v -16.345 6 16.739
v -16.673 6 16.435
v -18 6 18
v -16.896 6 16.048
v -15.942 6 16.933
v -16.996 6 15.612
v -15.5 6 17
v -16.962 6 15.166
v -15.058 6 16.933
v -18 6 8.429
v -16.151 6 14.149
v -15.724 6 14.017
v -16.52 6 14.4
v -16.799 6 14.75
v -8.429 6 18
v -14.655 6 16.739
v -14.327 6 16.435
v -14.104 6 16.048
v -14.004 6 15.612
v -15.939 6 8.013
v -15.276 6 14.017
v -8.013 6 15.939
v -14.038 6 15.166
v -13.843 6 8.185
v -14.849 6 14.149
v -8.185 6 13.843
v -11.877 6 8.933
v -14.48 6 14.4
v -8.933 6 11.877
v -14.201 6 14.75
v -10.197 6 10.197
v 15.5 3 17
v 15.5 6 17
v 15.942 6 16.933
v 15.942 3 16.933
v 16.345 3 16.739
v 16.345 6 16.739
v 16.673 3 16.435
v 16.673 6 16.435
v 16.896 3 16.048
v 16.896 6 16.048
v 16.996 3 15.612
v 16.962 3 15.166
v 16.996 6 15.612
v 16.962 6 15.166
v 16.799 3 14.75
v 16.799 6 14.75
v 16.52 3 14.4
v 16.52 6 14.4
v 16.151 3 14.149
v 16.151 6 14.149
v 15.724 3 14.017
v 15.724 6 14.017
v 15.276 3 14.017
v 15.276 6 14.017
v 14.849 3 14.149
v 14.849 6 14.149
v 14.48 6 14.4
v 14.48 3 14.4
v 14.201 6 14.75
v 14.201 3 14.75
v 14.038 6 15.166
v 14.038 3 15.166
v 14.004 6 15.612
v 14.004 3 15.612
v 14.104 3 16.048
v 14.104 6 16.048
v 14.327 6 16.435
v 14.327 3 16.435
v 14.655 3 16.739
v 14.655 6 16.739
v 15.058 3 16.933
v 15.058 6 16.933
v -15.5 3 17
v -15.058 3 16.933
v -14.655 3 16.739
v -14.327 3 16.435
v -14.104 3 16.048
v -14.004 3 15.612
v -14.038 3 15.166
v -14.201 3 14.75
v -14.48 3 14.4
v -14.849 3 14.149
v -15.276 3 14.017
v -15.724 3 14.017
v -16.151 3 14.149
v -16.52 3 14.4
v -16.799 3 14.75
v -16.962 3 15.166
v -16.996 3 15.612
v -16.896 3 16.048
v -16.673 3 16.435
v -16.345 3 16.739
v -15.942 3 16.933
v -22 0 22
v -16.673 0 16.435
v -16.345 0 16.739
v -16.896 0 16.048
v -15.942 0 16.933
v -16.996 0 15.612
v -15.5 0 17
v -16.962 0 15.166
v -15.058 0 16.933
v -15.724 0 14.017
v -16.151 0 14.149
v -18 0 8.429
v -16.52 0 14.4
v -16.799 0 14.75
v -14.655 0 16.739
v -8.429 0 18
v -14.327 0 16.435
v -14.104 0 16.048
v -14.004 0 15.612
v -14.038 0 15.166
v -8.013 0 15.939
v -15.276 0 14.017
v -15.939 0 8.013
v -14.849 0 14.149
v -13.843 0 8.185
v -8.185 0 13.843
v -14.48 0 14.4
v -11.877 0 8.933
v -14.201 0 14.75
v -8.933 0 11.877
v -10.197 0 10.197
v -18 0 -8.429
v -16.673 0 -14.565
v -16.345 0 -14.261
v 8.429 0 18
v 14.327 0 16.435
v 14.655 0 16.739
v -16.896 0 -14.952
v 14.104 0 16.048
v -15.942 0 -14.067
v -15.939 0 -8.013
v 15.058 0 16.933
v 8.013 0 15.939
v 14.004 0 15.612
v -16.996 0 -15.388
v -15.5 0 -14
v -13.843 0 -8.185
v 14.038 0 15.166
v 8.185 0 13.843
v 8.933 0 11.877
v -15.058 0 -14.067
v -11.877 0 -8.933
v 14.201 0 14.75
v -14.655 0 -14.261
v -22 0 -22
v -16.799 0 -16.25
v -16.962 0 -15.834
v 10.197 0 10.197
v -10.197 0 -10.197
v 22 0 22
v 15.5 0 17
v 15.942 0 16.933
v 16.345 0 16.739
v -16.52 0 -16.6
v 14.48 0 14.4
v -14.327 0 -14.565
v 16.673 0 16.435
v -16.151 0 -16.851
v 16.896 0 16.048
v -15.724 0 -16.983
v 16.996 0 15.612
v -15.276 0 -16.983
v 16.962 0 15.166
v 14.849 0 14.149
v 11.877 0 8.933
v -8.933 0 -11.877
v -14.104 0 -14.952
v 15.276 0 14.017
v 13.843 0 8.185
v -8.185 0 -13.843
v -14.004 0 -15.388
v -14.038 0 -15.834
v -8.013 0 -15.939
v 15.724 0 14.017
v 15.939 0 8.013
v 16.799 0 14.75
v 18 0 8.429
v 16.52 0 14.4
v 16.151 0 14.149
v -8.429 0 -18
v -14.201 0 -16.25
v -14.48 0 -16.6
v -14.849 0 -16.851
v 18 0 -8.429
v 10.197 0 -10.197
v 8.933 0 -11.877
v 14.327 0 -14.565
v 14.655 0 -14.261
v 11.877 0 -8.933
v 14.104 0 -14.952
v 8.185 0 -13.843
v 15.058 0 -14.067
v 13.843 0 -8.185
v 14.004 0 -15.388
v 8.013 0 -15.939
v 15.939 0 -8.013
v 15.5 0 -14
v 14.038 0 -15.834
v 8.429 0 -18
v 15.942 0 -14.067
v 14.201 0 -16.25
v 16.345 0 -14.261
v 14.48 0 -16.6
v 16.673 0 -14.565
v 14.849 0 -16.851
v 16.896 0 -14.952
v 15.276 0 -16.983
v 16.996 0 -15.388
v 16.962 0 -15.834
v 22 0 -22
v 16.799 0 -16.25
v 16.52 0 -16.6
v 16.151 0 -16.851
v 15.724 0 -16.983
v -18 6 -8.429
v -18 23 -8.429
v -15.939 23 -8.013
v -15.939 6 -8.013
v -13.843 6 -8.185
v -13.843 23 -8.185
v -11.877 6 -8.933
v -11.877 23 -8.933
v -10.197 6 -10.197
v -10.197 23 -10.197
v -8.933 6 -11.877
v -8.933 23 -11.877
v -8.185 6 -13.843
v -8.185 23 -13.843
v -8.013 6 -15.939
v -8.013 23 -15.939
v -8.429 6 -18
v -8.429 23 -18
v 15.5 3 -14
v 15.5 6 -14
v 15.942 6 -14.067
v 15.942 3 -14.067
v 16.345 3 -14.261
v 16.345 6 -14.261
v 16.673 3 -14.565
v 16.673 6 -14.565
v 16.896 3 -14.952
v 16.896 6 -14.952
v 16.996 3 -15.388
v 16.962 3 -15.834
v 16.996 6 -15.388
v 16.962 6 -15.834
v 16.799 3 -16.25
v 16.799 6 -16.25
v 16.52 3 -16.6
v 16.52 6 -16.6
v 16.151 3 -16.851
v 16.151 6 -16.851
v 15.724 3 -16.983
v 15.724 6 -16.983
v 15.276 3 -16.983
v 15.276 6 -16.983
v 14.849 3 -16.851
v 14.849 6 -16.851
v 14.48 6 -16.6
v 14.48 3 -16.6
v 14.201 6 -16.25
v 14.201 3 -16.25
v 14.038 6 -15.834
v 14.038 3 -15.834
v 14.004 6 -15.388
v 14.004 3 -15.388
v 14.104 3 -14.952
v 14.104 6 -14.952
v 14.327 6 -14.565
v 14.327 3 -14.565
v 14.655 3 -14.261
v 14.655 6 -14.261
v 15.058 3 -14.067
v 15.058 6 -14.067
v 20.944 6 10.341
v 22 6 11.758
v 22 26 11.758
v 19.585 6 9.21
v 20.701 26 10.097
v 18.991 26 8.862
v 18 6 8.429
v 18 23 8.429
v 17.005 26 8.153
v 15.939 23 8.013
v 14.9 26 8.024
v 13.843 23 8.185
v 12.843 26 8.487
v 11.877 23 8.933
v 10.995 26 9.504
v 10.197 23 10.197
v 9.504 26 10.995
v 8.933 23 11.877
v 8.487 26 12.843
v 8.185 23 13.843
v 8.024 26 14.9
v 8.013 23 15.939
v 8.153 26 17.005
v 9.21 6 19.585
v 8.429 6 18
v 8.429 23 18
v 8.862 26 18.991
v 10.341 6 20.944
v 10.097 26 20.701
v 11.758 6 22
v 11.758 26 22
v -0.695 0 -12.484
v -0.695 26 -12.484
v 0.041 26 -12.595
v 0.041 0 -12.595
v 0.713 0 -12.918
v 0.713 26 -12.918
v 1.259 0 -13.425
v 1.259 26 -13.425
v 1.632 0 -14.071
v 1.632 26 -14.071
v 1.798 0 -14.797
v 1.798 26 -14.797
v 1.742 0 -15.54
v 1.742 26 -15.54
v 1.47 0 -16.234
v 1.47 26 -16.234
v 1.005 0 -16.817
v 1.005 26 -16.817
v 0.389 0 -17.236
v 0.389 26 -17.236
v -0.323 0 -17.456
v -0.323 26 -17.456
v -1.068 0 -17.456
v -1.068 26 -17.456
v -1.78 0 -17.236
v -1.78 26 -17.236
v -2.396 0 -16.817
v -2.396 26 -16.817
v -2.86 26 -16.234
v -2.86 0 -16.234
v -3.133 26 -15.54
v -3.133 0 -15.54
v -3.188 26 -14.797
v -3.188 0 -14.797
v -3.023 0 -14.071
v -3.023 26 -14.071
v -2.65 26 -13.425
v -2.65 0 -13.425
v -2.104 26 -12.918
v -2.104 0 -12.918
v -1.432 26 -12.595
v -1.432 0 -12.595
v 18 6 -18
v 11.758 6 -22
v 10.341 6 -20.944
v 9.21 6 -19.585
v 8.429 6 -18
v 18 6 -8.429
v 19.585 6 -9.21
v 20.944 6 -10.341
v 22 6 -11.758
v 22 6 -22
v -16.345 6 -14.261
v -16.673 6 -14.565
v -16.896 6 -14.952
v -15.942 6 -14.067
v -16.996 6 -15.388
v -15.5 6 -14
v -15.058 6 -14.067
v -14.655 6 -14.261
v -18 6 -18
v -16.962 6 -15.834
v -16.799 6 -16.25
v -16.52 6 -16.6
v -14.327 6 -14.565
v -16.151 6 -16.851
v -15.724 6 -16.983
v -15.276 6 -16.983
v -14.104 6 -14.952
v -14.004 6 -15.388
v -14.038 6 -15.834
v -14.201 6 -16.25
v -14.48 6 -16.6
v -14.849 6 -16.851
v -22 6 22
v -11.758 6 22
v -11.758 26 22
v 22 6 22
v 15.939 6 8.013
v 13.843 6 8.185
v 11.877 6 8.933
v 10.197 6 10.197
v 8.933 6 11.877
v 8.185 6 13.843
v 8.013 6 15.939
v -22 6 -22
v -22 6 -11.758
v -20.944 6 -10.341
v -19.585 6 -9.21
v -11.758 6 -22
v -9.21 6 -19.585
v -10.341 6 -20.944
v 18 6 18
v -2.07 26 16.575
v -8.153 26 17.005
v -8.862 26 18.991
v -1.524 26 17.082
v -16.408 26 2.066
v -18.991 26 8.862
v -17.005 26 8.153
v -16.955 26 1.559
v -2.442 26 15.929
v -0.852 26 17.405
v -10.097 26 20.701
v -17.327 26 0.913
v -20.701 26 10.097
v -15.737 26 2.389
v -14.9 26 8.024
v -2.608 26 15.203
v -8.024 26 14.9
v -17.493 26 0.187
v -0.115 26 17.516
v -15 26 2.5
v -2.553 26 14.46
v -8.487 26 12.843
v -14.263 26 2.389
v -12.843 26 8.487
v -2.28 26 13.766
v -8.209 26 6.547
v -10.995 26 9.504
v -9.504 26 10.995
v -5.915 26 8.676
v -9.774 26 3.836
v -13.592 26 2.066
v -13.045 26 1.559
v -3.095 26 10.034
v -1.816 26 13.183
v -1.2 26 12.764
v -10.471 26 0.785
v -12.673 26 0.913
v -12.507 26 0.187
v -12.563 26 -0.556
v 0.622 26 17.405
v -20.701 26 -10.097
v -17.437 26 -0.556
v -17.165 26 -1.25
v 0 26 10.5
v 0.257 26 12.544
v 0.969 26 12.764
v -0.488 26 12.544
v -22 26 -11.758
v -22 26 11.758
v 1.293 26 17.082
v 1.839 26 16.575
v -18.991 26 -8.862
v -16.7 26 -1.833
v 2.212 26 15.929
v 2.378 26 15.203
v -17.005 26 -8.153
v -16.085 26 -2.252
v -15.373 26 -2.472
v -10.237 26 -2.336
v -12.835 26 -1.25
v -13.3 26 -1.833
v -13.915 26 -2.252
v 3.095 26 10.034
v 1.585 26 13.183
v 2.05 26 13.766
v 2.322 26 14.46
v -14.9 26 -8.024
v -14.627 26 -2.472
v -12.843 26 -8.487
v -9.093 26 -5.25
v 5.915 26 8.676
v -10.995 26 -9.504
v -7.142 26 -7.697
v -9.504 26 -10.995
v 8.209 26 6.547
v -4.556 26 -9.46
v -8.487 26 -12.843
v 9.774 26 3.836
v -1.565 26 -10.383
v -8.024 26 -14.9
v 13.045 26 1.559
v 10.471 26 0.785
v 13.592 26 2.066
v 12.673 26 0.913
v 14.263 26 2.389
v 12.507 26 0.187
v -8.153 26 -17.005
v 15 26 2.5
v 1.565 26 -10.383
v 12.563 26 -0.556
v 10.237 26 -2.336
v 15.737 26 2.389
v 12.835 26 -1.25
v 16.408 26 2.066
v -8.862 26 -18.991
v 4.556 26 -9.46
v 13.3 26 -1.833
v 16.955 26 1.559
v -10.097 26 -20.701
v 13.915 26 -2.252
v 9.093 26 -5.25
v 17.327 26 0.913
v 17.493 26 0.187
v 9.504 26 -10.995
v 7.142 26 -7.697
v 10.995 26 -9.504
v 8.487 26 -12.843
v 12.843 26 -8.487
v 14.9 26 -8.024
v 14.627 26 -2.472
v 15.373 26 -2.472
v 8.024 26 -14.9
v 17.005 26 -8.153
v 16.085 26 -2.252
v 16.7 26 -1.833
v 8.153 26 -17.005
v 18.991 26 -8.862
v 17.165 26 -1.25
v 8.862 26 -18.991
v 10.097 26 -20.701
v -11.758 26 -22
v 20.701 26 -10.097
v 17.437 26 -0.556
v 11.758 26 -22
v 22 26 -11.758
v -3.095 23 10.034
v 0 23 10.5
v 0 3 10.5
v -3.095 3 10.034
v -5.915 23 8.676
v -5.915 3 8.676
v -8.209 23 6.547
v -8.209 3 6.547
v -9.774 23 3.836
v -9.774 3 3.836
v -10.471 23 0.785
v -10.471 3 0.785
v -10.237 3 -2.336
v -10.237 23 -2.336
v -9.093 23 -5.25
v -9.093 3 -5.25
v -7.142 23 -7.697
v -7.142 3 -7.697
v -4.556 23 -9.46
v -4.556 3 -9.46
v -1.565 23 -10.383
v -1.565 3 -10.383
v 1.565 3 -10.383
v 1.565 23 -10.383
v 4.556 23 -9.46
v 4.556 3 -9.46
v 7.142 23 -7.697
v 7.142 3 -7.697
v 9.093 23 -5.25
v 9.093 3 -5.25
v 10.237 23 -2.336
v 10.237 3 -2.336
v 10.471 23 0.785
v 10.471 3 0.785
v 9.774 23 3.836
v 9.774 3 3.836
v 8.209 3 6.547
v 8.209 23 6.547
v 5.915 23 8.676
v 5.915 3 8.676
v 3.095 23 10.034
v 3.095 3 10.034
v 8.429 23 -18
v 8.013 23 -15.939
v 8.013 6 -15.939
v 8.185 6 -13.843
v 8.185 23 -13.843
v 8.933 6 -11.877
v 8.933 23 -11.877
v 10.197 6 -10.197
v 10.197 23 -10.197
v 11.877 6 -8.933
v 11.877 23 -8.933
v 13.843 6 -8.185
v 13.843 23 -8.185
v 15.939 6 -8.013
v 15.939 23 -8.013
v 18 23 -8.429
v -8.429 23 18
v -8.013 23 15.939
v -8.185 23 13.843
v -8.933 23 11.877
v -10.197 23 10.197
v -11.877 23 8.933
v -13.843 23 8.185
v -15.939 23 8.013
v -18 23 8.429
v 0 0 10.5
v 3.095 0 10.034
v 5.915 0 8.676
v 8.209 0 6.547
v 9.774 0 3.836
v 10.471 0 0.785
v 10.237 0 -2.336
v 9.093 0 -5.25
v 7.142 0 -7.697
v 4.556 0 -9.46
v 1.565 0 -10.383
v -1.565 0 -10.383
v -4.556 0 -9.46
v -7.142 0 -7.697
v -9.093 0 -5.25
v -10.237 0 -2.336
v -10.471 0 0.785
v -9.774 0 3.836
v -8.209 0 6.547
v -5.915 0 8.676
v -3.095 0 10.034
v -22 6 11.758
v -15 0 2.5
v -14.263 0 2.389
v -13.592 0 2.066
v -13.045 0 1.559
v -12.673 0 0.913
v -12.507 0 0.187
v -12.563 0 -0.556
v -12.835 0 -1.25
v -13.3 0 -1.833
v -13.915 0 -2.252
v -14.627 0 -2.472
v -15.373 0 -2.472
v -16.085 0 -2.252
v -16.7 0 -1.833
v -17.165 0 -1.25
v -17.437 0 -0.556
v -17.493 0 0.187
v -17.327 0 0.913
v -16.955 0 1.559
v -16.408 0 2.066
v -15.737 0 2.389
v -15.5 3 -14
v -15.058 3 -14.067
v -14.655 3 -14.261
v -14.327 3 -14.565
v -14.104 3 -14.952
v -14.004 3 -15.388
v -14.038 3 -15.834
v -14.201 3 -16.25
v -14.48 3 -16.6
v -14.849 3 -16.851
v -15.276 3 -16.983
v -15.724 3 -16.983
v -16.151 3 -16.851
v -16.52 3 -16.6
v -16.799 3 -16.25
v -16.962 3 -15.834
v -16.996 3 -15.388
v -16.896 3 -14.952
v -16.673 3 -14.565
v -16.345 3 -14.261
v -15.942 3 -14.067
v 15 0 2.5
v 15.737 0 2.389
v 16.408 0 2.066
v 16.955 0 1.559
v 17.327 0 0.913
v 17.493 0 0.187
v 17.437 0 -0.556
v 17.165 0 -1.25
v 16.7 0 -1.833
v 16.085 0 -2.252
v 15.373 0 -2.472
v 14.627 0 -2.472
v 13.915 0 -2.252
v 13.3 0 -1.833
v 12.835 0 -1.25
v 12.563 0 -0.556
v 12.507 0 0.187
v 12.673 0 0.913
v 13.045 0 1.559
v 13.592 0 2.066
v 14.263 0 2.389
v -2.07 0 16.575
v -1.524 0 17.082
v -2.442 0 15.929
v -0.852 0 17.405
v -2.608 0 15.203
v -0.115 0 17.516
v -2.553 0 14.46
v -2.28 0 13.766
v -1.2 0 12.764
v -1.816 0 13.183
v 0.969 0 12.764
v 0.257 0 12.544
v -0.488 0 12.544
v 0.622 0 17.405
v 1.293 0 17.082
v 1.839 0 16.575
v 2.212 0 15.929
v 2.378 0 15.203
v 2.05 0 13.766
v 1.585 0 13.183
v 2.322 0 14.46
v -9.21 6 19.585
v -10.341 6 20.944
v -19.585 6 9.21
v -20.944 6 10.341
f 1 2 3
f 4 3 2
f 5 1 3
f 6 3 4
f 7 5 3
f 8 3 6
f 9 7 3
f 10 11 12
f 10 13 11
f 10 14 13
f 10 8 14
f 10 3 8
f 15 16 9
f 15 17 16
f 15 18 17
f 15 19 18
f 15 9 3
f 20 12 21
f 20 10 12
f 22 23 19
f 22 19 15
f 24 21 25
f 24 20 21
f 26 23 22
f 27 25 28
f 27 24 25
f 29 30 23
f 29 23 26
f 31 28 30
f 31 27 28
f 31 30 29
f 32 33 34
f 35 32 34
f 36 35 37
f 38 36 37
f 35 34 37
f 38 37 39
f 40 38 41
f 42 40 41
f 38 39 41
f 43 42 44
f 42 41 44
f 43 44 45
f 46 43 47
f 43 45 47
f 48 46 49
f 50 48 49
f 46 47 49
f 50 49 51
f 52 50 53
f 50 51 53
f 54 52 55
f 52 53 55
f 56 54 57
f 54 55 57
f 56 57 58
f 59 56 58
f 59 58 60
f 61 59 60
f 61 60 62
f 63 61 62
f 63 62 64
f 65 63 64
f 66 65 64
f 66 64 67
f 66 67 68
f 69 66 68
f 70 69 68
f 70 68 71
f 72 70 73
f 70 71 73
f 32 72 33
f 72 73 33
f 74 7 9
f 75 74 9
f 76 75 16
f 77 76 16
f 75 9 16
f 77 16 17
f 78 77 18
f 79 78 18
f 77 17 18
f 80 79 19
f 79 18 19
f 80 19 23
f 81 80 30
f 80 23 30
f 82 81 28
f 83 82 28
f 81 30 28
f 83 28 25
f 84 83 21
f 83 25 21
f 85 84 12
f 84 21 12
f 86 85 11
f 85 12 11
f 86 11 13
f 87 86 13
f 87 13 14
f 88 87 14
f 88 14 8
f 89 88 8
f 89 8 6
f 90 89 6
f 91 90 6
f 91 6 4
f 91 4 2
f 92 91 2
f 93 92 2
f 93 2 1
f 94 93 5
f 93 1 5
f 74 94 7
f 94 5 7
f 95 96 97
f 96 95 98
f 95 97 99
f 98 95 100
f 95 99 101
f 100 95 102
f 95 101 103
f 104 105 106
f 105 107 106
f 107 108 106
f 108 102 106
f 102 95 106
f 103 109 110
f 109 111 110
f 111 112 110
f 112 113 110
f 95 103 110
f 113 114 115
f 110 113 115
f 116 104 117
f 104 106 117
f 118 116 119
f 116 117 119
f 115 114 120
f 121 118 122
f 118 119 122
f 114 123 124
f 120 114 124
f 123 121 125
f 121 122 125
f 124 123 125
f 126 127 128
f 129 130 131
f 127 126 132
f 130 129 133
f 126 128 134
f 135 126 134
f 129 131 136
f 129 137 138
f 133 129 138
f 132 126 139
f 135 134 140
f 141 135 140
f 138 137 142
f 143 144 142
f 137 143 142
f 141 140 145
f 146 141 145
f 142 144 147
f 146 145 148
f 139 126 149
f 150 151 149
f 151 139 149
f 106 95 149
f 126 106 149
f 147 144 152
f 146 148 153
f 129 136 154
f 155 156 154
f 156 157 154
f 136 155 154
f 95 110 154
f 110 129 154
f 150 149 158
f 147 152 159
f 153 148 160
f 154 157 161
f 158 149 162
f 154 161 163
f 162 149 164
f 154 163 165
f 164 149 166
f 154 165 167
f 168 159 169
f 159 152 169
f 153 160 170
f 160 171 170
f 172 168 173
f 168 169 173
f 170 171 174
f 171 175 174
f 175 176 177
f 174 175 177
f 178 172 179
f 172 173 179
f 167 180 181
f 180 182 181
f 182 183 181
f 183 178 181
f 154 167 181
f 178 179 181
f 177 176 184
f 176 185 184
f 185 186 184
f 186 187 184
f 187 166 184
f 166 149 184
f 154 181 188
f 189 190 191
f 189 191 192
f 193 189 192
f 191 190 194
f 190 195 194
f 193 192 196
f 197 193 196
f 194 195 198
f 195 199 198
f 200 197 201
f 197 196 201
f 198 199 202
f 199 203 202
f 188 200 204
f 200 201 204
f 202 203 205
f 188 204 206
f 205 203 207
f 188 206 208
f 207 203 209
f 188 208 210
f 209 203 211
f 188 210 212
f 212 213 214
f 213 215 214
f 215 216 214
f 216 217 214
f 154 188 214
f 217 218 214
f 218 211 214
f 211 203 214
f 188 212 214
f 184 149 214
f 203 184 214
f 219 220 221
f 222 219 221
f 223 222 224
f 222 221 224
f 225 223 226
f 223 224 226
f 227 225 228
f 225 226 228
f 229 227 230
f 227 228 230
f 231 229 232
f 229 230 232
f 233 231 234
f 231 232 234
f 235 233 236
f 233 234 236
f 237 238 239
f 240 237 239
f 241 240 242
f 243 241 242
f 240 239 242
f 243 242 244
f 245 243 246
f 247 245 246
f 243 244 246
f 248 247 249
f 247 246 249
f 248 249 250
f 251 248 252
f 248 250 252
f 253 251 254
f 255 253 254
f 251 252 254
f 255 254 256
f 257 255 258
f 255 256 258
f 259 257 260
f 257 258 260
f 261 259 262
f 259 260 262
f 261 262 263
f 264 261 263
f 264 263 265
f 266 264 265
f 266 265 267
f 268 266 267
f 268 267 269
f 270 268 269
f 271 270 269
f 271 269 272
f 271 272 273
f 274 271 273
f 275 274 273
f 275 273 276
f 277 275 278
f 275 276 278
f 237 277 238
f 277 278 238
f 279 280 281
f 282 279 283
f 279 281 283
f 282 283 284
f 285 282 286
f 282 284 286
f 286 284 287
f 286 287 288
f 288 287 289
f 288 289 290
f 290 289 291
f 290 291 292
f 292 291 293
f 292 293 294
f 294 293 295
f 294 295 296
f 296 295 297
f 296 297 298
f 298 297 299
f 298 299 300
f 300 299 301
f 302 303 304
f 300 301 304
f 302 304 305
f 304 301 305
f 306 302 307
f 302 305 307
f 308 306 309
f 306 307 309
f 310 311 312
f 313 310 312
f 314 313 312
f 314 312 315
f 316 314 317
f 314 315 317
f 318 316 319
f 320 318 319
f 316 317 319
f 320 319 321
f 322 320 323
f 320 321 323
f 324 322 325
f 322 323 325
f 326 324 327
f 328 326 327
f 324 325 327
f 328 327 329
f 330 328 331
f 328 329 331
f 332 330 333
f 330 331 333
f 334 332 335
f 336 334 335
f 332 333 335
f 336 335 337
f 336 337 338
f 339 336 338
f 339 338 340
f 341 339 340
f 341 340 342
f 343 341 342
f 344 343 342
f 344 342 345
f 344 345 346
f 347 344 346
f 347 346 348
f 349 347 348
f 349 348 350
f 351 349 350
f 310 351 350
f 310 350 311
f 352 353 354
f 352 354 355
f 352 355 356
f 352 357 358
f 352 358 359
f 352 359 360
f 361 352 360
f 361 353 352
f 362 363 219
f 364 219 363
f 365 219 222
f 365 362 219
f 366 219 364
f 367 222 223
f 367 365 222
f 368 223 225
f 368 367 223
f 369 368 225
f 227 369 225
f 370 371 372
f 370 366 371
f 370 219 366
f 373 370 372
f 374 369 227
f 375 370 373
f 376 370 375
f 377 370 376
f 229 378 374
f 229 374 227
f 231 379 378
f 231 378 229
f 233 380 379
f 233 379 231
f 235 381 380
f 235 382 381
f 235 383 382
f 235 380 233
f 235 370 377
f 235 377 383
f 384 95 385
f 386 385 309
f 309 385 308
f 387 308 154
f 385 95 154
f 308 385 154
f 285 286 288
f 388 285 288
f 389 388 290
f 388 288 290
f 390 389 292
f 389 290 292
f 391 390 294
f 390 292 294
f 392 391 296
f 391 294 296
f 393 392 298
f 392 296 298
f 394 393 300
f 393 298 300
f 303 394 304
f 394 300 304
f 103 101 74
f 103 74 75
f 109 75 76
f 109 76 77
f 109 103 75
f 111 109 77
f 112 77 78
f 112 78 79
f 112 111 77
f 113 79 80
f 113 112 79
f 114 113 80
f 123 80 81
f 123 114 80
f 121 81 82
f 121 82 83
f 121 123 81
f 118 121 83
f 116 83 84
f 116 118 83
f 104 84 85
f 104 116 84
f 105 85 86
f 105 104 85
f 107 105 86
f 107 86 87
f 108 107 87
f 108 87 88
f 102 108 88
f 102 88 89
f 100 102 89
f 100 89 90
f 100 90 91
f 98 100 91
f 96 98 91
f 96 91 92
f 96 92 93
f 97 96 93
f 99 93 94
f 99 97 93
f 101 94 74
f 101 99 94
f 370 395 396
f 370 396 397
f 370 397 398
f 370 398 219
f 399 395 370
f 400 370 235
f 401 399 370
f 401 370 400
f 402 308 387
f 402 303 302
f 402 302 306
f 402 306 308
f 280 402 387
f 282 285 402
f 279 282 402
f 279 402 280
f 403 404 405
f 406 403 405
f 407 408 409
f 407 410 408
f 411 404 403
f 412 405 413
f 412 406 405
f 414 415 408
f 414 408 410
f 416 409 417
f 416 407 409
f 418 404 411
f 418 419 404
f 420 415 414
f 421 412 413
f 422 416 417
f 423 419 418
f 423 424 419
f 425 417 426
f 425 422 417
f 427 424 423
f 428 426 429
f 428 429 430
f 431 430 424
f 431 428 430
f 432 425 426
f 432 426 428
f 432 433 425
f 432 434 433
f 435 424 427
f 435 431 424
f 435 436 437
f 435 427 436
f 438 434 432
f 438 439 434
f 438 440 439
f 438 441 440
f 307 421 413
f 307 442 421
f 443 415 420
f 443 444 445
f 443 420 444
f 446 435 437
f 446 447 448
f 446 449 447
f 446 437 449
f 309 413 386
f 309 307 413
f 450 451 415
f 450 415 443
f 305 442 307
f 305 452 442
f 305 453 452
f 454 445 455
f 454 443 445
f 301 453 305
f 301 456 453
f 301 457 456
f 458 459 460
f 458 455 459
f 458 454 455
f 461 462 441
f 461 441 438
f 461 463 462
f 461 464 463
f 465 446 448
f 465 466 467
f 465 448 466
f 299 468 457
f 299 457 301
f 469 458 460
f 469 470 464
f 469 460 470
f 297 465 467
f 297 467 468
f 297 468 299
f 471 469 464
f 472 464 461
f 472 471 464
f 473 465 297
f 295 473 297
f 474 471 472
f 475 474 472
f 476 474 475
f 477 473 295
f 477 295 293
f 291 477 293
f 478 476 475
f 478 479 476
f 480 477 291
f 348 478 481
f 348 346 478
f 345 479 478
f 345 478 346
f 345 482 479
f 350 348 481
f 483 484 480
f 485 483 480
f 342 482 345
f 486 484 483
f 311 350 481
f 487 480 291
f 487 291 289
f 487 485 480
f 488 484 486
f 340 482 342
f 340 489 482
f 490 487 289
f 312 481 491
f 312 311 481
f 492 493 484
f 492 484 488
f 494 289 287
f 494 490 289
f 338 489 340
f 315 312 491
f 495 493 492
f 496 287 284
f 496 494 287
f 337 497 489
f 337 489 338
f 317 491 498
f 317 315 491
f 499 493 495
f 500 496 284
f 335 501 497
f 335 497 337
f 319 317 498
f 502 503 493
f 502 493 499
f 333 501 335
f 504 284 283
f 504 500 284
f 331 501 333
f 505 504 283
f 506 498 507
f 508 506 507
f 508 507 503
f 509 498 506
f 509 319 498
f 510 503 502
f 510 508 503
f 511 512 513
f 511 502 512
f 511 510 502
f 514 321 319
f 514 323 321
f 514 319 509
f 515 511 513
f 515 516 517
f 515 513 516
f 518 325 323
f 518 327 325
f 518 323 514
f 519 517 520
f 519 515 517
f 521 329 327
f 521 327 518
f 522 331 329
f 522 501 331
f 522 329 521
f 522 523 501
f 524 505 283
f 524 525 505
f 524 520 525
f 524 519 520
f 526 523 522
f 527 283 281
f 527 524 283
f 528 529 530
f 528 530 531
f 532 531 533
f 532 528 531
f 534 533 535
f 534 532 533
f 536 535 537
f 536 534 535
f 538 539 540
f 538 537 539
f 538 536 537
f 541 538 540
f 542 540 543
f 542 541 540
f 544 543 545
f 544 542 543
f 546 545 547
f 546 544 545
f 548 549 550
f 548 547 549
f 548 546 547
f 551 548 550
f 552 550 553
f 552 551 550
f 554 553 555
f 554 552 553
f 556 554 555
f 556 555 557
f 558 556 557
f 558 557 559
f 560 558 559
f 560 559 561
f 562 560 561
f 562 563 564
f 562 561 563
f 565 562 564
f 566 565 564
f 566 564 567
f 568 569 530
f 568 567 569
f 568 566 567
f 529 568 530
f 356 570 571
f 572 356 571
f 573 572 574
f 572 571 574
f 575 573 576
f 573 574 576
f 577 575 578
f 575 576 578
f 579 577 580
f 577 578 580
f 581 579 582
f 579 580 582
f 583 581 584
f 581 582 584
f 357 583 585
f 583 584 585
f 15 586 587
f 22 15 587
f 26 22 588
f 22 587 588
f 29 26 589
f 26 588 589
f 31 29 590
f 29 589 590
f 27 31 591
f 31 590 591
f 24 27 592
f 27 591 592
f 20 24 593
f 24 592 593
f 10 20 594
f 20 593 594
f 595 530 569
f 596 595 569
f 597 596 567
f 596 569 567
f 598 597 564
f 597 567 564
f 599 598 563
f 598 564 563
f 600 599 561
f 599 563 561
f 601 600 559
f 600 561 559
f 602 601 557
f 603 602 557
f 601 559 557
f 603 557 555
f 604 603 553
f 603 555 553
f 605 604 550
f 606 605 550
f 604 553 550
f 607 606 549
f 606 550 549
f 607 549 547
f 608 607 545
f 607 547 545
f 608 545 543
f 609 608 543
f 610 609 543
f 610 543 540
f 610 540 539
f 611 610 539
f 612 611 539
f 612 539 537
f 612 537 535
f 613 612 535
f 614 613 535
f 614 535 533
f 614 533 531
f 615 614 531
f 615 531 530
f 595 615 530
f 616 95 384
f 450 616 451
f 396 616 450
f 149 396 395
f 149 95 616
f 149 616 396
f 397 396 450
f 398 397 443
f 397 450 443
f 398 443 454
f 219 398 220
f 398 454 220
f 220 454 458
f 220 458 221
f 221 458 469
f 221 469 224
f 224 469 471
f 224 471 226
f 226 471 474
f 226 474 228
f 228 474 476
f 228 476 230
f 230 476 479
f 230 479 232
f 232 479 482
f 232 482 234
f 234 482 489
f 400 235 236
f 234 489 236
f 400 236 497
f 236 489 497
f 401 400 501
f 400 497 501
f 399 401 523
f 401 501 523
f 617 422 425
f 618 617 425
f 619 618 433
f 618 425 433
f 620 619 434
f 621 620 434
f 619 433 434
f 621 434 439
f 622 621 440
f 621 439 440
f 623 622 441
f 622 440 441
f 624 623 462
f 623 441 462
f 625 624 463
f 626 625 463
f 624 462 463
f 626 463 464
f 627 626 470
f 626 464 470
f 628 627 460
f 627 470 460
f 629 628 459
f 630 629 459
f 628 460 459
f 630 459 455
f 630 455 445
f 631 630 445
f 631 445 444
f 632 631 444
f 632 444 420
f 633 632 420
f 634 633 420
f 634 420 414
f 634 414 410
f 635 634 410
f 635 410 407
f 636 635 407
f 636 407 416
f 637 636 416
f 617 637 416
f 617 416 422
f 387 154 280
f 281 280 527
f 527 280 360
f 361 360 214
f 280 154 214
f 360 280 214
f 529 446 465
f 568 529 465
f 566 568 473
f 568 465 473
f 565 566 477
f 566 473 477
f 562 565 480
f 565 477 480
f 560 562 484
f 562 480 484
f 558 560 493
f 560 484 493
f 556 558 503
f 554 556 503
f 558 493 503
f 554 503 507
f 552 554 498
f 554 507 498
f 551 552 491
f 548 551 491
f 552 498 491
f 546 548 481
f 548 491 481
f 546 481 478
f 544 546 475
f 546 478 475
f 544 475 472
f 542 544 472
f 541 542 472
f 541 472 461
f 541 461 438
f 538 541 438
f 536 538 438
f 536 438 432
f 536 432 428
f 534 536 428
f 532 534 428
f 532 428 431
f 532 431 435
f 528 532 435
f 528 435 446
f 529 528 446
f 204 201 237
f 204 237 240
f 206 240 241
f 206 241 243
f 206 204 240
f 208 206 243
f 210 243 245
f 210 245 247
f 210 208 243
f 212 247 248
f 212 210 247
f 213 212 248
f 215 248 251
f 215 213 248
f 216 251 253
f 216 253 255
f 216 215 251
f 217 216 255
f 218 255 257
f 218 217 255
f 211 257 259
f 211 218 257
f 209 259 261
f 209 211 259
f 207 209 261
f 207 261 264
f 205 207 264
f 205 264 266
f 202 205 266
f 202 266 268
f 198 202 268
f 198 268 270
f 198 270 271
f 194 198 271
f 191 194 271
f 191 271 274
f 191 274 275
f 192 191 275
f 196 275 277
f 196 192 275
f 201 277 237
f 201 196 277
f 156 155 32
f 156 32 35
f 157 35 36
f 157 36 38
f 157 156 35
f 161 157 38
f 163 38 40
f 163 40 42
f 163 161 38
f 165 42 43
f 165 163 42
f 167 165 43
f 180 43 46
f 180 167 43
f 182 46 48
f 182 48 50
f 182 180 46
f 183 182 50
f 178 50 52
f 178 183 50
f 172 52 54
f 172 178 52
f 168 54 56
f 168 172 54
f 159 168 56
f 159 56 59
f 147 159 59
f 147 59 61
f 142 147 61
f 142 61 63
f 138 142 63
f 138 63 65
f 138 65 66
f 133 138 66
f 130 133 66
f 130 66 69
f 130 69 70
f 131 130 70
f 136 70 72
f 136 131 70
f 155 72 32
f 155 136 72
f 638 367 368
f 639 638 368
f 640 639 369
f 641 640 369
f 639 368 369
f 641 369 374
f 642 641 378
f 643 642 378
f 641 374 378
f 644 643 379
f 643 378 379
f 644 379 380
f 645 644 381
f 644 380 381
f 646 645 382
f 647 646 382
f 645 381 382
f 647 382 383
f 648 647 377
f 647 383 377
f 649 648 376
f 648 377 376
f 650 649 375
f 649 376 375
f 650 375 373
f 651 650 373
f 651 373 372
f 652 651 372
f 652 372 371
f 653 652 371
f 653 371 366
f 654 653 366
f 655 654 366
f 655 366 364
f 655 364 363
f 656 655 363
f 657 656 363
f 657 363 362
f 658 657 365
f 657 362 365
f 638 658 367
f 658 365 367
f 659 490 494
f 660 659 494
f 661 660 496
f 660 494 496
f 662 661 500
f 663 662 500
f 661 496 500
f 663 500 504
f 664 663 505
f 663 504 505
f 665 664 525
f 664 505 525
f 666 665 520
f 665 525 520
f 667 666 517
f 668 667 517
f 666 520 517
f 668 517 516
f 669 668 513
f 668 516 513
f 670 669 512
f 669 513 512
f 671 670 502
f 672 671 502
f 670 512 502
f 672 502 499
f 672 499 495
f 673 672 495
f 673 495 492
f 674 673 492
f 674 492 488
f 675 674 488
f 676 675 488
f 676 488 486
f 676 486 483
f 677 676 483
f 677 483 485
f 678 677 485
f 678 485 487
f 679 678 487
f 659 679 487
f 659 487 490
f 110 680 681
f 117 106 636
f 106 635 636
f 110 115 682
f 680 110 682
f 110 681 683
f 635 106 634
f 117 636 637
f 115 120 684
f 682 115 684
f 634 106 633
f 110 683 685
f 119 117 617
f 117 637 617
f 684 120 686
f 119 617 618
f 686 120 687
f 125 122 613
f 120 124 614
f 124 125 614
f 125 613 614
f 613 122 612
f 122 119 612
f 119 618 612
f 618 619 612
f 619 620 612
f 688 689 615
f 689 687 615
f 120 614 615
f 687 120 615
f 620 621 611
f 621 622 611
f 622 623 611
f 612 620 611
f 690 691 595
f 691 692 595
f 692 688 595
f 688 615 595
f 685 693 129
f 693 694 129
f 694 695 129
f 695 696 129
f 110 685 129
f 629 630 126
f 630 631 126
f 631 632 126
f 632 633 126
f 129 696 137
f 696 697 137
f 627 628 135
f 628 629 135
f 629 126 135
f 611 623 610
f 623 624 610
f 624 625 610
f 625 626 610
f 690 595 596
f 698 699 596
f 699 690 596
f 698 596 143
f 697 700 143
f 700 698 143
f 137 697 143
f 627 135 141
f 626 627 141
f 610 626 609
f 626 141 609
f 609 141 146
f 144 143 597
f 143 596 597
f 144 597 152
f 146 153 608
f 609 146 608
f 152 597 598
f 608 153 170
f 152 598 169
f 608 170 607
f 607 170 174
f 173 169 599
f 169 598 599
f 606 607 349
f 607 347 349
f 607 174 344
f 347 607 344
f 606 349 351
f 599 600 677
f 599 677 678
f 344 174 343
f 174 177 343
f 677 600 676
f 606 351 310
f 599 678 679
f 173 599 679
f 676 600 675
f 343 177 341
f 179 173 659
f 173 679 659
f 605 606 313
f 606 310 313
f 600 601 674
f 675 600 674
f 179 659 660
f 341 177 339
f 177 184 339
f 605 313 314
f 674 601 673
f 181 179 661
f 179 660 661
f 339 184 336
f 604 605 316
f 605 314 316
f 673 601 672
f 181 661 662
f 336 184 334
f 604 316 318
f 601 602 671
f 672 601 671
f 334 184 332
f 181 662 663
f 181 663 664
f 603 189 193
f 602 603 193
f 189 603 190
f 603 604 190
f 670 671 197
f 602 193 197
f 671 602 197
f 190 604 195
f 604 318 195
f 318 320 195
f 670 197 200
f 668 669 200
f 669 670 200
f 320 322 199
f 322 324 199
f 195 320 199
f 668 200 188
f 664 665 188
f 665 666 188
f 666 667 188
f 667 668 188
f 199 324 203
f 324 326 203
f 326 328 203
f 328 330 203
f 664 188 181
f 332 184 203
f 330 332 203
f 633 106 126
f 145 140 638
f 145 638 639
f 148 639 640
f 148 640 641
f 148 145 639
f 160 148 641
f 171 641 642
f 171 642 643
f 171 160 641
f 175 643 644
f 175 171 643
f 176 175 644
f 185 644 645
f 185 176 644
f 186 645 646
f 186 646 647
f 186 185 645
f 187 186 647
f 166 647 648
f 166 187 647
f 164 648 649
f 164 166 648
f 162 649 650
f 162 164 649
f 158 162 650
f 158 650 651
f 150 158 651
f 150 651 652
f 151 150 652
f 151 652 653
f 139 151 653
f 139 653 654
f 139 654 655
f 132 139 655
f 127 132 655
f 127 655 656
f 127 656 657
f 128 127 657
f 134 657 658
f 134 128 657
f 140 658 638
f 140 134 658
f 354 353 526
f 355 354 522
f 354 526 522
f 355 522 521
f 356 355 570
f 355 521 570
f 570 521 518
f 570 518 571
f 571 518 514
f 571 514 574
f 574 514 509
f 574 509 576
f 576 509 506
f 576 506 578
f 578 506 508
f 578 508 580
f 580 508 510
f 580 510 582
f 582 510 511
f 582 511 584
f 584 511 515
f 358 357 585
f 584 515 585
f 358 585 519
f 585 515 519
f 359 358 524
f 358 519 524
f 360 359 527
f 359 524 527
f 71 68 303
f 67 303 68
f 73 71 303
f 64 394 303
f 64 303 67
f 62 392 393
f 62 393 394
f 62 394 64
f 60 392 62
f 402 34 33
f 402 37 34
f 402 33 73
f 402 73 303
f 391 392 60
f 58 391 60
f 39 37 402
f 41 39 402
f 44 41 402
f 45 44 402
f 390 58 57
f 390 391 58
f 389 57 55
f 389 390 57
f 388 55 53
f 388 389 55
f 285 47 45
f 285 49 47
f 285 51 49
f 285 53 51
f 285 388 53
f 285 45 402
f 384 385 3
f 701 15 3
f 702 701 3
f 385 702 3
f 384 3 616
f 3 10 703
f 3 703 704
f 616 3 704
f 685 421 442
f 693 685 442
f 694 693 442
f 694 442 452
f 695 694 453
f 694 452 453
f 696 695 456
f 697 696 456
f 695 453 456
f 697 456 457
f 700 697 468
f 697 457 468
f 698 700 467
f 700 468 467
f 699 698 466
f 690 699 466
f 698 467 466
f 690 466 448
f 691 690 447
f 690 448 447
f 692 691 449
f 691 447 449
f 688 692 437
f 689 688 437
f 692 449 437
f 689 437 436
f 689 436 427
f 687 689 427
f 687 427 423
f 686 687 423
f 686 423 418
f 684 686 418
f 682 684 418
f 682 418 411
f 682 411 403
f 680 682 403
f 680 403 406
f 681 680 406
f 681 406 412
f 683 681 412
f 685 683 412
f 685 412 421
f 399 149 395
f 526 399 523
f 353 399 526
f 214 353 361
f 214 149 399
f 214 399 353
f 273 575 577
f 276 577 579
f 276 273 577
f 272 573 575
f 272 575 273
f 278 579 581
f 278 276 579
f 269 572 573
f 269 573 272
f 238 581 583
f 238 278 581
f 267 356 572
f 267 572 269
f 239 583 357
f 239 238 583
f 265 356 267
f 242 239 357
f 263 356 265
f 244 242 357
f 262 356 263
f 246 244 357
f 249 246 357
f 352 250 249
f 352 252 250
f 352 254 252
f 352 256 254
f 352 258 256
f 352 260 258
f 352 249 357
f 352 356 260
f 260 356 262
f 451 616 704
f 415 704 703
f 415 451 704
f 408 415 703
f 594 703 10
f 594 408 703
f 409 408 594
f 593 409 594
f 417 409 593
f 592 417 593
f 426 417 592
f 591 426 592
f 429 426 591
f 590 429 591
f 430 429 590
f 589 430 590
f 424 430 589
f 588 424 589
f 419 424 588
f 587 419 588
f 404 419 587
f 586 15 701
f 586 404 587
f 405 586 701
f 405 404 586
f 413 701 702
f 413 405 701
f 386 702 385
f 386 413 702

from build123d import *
from build123d.topology import SkipClean

# Parameters (mm, degrees)
SKETCH1_W           = 44
SKETCH1_H           = 44
SKETCH1_R           = 1.5
BOSS_EXTRUDE1_DEPTH = 3
SKETCH2_W           = 44
SKETCH2_H           = 44
SKETCH2_W_2         = 36
SKETCH2_H_2         = 36
BOSS_EXTRUDE2_DEPTH = 20
SKETCH3_R           = 10.5
CUT_EXTRUDE1_DEPTH  = 20
SKETCH4_W           = 44
SKETCH4_H           = 44
BOSS_EXTRUDE3_DEPTH = 3
SKETCH5_R           = 10.5
CUT_EXTRUDE2_DEPTH  = 20
SKETCH6_R           = 10.5
BOSS_EXTRUDE4_DEPTH = 23
SKETCH7_R           = 2.5
CUT_EXTRUDE3_DEPTH  = 33
BOSS_EXTRUDE5_START = 3
SKETCH8_R           = 1.5
BOSS_EXTRUDE5_DEPTH = 3


with BuildPart() as part:
    # Sketch1 → Boss-Extrude1 (new body)
    with BuildSketch(Plane(origin=(0, 0, 0), x_dir=(1, 0, 0), z_dir=(0, 1, 0))):
        Rectangle(SKETCH1_W, SKETCH1_H)
        with Locations(Location((-15.5, 15.5, 0), (0, 0, 270))):
            Circle(SKETCH1_R, mode=Mode.SUBTRACT)
        with Locations(Location((15.5, 15.5, 0), (0, 0, 270))):
            Circle(SKETCH1_R, mode=Mode.SUBTRACT)
        with Locations(Location((-15.5, -15.5, 0), (0, 0, 270))):
            Circle(SKETCH1_R, mode=Mode.SUBTRACT)
        with Locations(Location((15.5, -15.5, 0), (0, 0, 270))):
            Circle(SKETCH1_R, mode=Mode.SUBTRACT)
    extrude(amount=BOSS_EXTRUDE1_DEPTH)

    # Sketch2 → Boss-Extrude2 (add)
    with BuildSketch(Plane(origin=(0, 3, 0), x_dir=(1, 0, 0), z_dir=(0, 1, 0))):
        Rectangle(SKETCH2_W, SKETCH2_H)
        Rectangle(SKETCH2_W_2, SKETCH2_H_2, mode=Mode.SUBTRACT)
    extrude(amount=BOSS_EXTRUDE2_DEPTH)

    # Sketch3 → Cut-Extrude1 (cut)
    with BuildSketch(Plane(origin=(0, 3, 0), x_dir=(1, 0, 0), z_dir=(0, 1, 0))):
        with Locations(Location((0, 0, 0), (0, 0, 270))):
            Circle(SKETCH3_R)
    extrude(amount=-CUT_EXTRUDE1_DEPTH, mode=Mode.SUBTRACT)

    # Sketch4 → Boss-Extrude3 (add)
    with BuildSketch(Plane(origin=(0, 23, 0), x_dir=(1, 0, 0), z_dir=(0, 1, 0))):
        Rectangle(SKETCH4_W, SKETCH4_H)
    extrude(amount=BOSS_EXTRUDE3_DEPTH)

    # Sketch5 → Cut-Extrude2 (cut)
    with BuildSketch(Plane(origin=(0, 26, 0), x_dir=(1, 0, 0), z_dir=(0, 1, 0))):
        with Locations(Location((0, 0, 0), (0, 0, 270))):
            Circle(SKETCH5_R)
        with BuildLine():
            Line((-22, 22), (-22, 19.241657387))
            ThreePointArc((-22, 19.241657387), (-10.196699141, 10.196699141), (-19.241657387, 22))
            Line((-19.241657387, 22), (-22, 22))
        make_face()
        with BuildLine():
            Line((22, 22), (19.241657387, 22))
            ThreePointArc((19.241657387, 22), (10.196699141, 10.196699141), (22, 19.241657387))
            Line((22, 19.241657387), (22, 22))
        make_face()
        with BuildLine():
            Line((22, -22), (22, -19.241657387))
            ThreePointArc((22, -19.241657387), (10.196699141, -10.196699141), (19.241657387, -22))
            Line((19.241657387, -22), (22, -22))
        make_face()
        with BuildLine():
            Line((-22, -22), (-22, -19.241657387))
            ThreePointArc((-22, -19.241657387), (-10.196699141, -10.196699141), (-19.241657387, -22))
            Line((-19.241657387, -22), (-22, -22))
        make_face()
    extrude(amount=-CUT_EXTRUDE2_DEPTH, mode=Mode.SUBTRACT)

    # Sketch6 → Boss-Extrude4 (add)
    with SkipClean():  # the faces are left unmerged after this step: merging them gives an invalid solid
        with BuildSketch(Plane.XZ.offset(-23)):
            with BuildLine():
                Line((8.428932188, 18), (-8.428932188, 18))
                ThreePointArc((-8.428932188, 18), (-10.196699141, 10.196699141), (-18, 8.428932188))
                Line((-18, 8.428932188), (-18, -8.428932188))
                ThreePointArc((-18, -8.428932188), (-10.196699141, -10.196699141), (-8.428932188, -18))
                Line((-8.428932188, -18), (8.428932188, -18))
                ThreePointArc((8.428932188, -18), (10.196699141, -10.196699141), (18, -8.428932188))
                Line((18, -8.428932188), (18, 8.428932188))
                ThreePointArc((18, 8.428932188), (10.196699141, 10.196699141), (8.428932188, 18))
            make_face()
            with Locations(Location((0, 0, 0), (0, 0, 90))):
                Circle(SKETCH6_R, mode=Mode.SUBTRACT)
        extrude(amount=BOSS_EXTRUDE4_DEPTH)

    # Sketch7 → Cut-Extrude3 (cut)
    with SkipClean():  # the faces are left unmerged after this step: merging them gives an invalid solid
        with BuildSketch(Plane(origin=(0, 26, 0), x_dir=(1, 0, 0), z_dir=(0, 1, 0))):
            with Locations(Location((15, 0, 0), (0, 0, 270))):
                Circle(SKETCH7_R)
            with Locations(Location((-15, 0, 0), (0, 0, 270))):
                Circle(SKETCH7_R)
            with Locations(Location((-0.695414312, 14.983871293, 0), (0, 0, 270))):
                Circle(SKETCH7_R)
            with Locations(Location((-0.115302399, -15.016128707, 0), (0, 0, 270))):
                Circle(SKETCH7_R)
        extrude(amount=-CUT_EXTRUDE3_DEPTH, mode=Mode.SUBTRACT)

    # Sketch8 → Boss-Extrude5 (add)
    # profile 1 of 4: a face of its own
    with SkipClean():  # the faces are left unmerged after this step: merging them gives an invalid solid
        with BuildSketch(Plane(origin=(0, 3, 0), x_dir=(1, 0, 0), z_dir=(0, 1, 0)).offset(BOSS_EXTRUDE5_START)):
            with BuildLine():
                Line((8.428932188, -18), (18, -18))
                Line((18, -18), (18, -8.428932188))
                ThreePointArc((18, -8.428932188), (10.196699141, -10.196699141), (8.428932188, -18))
            make_face()
            with Locations(Location((15.5, -15.5, 0), (0, 0, 270))):
                Circle(SKETCH8_R, mode=Mode.SUBTRACT)
        # profile 2 of 4: a face of its own
        with BuildSketch(Plane(origin=(0, 3, 0), x_dir=(1, 0, 0), z_dir=(0, 1, 0)).offset(BOSS_EXTRUDE5_START)):
            with BuildLine():
                Line((18, 8.428932188), (18, 18))
                Line((18, 18), (8.428932188, 18))
                ThreePointArc((8.428932188, 18), (10.196699141, 10.196699141), (18, 8.428932188))
            make_face()
            with Locations(Location((15.5, 15.5, 0), (0, 0, 270))):
                Circle(SKETCH8_R, mode=Mode.SUBTRACT)
        # profile 3 of 4: a face of its own
        with BuildSketch(Plane(origin=(0, 3, 0), x_dir=(1, 0, 0), z_dir=(0, 1, 0)).offset(BOSS_EXTRUDE5_START)):
            with BuildLine():
                Line((-8.428932188, 18), (-18, 18))
                Line((-18, 18), (-18, 8.428932188))
                ThreePointArc((-18, 8.428932188), (-10.196699141, 10.196699141), (-8.428932188, 18))
            make_face()
            with Locations(Location((-15.5, 15.5, 0), (0, 0, 270))):
                Circle(SKETCH8_R, mode=Mode.SUBTRACT)
        # profile 4 of 4: a face of its own
        with BuildSketch(Plane(origin=(0, 3, 0), x_dir=(1, 0, 0), z_dir=(0, 1, 0)).offset(BOSS_EXTRUDE5_START)):
            with BuildLine():
                Line((-18, -8.428932188), (-18, -18))
                Line((-18, -18), (-8.428932188, -18))
                ThreePointArc((-8.428932188, -18), (-10.196699141, -10.196699141), (-18, -8.428932188))
            make_face()
            with Locations(Location((-15.5, -15.5, 0), (0, 0, 270))):
                Circle(SKETCH8_R, mode=Mode.SUBTRACT)
        extrude(amount=-BOSS_EXTRUDE5_DEPTH)


solid = part.part
